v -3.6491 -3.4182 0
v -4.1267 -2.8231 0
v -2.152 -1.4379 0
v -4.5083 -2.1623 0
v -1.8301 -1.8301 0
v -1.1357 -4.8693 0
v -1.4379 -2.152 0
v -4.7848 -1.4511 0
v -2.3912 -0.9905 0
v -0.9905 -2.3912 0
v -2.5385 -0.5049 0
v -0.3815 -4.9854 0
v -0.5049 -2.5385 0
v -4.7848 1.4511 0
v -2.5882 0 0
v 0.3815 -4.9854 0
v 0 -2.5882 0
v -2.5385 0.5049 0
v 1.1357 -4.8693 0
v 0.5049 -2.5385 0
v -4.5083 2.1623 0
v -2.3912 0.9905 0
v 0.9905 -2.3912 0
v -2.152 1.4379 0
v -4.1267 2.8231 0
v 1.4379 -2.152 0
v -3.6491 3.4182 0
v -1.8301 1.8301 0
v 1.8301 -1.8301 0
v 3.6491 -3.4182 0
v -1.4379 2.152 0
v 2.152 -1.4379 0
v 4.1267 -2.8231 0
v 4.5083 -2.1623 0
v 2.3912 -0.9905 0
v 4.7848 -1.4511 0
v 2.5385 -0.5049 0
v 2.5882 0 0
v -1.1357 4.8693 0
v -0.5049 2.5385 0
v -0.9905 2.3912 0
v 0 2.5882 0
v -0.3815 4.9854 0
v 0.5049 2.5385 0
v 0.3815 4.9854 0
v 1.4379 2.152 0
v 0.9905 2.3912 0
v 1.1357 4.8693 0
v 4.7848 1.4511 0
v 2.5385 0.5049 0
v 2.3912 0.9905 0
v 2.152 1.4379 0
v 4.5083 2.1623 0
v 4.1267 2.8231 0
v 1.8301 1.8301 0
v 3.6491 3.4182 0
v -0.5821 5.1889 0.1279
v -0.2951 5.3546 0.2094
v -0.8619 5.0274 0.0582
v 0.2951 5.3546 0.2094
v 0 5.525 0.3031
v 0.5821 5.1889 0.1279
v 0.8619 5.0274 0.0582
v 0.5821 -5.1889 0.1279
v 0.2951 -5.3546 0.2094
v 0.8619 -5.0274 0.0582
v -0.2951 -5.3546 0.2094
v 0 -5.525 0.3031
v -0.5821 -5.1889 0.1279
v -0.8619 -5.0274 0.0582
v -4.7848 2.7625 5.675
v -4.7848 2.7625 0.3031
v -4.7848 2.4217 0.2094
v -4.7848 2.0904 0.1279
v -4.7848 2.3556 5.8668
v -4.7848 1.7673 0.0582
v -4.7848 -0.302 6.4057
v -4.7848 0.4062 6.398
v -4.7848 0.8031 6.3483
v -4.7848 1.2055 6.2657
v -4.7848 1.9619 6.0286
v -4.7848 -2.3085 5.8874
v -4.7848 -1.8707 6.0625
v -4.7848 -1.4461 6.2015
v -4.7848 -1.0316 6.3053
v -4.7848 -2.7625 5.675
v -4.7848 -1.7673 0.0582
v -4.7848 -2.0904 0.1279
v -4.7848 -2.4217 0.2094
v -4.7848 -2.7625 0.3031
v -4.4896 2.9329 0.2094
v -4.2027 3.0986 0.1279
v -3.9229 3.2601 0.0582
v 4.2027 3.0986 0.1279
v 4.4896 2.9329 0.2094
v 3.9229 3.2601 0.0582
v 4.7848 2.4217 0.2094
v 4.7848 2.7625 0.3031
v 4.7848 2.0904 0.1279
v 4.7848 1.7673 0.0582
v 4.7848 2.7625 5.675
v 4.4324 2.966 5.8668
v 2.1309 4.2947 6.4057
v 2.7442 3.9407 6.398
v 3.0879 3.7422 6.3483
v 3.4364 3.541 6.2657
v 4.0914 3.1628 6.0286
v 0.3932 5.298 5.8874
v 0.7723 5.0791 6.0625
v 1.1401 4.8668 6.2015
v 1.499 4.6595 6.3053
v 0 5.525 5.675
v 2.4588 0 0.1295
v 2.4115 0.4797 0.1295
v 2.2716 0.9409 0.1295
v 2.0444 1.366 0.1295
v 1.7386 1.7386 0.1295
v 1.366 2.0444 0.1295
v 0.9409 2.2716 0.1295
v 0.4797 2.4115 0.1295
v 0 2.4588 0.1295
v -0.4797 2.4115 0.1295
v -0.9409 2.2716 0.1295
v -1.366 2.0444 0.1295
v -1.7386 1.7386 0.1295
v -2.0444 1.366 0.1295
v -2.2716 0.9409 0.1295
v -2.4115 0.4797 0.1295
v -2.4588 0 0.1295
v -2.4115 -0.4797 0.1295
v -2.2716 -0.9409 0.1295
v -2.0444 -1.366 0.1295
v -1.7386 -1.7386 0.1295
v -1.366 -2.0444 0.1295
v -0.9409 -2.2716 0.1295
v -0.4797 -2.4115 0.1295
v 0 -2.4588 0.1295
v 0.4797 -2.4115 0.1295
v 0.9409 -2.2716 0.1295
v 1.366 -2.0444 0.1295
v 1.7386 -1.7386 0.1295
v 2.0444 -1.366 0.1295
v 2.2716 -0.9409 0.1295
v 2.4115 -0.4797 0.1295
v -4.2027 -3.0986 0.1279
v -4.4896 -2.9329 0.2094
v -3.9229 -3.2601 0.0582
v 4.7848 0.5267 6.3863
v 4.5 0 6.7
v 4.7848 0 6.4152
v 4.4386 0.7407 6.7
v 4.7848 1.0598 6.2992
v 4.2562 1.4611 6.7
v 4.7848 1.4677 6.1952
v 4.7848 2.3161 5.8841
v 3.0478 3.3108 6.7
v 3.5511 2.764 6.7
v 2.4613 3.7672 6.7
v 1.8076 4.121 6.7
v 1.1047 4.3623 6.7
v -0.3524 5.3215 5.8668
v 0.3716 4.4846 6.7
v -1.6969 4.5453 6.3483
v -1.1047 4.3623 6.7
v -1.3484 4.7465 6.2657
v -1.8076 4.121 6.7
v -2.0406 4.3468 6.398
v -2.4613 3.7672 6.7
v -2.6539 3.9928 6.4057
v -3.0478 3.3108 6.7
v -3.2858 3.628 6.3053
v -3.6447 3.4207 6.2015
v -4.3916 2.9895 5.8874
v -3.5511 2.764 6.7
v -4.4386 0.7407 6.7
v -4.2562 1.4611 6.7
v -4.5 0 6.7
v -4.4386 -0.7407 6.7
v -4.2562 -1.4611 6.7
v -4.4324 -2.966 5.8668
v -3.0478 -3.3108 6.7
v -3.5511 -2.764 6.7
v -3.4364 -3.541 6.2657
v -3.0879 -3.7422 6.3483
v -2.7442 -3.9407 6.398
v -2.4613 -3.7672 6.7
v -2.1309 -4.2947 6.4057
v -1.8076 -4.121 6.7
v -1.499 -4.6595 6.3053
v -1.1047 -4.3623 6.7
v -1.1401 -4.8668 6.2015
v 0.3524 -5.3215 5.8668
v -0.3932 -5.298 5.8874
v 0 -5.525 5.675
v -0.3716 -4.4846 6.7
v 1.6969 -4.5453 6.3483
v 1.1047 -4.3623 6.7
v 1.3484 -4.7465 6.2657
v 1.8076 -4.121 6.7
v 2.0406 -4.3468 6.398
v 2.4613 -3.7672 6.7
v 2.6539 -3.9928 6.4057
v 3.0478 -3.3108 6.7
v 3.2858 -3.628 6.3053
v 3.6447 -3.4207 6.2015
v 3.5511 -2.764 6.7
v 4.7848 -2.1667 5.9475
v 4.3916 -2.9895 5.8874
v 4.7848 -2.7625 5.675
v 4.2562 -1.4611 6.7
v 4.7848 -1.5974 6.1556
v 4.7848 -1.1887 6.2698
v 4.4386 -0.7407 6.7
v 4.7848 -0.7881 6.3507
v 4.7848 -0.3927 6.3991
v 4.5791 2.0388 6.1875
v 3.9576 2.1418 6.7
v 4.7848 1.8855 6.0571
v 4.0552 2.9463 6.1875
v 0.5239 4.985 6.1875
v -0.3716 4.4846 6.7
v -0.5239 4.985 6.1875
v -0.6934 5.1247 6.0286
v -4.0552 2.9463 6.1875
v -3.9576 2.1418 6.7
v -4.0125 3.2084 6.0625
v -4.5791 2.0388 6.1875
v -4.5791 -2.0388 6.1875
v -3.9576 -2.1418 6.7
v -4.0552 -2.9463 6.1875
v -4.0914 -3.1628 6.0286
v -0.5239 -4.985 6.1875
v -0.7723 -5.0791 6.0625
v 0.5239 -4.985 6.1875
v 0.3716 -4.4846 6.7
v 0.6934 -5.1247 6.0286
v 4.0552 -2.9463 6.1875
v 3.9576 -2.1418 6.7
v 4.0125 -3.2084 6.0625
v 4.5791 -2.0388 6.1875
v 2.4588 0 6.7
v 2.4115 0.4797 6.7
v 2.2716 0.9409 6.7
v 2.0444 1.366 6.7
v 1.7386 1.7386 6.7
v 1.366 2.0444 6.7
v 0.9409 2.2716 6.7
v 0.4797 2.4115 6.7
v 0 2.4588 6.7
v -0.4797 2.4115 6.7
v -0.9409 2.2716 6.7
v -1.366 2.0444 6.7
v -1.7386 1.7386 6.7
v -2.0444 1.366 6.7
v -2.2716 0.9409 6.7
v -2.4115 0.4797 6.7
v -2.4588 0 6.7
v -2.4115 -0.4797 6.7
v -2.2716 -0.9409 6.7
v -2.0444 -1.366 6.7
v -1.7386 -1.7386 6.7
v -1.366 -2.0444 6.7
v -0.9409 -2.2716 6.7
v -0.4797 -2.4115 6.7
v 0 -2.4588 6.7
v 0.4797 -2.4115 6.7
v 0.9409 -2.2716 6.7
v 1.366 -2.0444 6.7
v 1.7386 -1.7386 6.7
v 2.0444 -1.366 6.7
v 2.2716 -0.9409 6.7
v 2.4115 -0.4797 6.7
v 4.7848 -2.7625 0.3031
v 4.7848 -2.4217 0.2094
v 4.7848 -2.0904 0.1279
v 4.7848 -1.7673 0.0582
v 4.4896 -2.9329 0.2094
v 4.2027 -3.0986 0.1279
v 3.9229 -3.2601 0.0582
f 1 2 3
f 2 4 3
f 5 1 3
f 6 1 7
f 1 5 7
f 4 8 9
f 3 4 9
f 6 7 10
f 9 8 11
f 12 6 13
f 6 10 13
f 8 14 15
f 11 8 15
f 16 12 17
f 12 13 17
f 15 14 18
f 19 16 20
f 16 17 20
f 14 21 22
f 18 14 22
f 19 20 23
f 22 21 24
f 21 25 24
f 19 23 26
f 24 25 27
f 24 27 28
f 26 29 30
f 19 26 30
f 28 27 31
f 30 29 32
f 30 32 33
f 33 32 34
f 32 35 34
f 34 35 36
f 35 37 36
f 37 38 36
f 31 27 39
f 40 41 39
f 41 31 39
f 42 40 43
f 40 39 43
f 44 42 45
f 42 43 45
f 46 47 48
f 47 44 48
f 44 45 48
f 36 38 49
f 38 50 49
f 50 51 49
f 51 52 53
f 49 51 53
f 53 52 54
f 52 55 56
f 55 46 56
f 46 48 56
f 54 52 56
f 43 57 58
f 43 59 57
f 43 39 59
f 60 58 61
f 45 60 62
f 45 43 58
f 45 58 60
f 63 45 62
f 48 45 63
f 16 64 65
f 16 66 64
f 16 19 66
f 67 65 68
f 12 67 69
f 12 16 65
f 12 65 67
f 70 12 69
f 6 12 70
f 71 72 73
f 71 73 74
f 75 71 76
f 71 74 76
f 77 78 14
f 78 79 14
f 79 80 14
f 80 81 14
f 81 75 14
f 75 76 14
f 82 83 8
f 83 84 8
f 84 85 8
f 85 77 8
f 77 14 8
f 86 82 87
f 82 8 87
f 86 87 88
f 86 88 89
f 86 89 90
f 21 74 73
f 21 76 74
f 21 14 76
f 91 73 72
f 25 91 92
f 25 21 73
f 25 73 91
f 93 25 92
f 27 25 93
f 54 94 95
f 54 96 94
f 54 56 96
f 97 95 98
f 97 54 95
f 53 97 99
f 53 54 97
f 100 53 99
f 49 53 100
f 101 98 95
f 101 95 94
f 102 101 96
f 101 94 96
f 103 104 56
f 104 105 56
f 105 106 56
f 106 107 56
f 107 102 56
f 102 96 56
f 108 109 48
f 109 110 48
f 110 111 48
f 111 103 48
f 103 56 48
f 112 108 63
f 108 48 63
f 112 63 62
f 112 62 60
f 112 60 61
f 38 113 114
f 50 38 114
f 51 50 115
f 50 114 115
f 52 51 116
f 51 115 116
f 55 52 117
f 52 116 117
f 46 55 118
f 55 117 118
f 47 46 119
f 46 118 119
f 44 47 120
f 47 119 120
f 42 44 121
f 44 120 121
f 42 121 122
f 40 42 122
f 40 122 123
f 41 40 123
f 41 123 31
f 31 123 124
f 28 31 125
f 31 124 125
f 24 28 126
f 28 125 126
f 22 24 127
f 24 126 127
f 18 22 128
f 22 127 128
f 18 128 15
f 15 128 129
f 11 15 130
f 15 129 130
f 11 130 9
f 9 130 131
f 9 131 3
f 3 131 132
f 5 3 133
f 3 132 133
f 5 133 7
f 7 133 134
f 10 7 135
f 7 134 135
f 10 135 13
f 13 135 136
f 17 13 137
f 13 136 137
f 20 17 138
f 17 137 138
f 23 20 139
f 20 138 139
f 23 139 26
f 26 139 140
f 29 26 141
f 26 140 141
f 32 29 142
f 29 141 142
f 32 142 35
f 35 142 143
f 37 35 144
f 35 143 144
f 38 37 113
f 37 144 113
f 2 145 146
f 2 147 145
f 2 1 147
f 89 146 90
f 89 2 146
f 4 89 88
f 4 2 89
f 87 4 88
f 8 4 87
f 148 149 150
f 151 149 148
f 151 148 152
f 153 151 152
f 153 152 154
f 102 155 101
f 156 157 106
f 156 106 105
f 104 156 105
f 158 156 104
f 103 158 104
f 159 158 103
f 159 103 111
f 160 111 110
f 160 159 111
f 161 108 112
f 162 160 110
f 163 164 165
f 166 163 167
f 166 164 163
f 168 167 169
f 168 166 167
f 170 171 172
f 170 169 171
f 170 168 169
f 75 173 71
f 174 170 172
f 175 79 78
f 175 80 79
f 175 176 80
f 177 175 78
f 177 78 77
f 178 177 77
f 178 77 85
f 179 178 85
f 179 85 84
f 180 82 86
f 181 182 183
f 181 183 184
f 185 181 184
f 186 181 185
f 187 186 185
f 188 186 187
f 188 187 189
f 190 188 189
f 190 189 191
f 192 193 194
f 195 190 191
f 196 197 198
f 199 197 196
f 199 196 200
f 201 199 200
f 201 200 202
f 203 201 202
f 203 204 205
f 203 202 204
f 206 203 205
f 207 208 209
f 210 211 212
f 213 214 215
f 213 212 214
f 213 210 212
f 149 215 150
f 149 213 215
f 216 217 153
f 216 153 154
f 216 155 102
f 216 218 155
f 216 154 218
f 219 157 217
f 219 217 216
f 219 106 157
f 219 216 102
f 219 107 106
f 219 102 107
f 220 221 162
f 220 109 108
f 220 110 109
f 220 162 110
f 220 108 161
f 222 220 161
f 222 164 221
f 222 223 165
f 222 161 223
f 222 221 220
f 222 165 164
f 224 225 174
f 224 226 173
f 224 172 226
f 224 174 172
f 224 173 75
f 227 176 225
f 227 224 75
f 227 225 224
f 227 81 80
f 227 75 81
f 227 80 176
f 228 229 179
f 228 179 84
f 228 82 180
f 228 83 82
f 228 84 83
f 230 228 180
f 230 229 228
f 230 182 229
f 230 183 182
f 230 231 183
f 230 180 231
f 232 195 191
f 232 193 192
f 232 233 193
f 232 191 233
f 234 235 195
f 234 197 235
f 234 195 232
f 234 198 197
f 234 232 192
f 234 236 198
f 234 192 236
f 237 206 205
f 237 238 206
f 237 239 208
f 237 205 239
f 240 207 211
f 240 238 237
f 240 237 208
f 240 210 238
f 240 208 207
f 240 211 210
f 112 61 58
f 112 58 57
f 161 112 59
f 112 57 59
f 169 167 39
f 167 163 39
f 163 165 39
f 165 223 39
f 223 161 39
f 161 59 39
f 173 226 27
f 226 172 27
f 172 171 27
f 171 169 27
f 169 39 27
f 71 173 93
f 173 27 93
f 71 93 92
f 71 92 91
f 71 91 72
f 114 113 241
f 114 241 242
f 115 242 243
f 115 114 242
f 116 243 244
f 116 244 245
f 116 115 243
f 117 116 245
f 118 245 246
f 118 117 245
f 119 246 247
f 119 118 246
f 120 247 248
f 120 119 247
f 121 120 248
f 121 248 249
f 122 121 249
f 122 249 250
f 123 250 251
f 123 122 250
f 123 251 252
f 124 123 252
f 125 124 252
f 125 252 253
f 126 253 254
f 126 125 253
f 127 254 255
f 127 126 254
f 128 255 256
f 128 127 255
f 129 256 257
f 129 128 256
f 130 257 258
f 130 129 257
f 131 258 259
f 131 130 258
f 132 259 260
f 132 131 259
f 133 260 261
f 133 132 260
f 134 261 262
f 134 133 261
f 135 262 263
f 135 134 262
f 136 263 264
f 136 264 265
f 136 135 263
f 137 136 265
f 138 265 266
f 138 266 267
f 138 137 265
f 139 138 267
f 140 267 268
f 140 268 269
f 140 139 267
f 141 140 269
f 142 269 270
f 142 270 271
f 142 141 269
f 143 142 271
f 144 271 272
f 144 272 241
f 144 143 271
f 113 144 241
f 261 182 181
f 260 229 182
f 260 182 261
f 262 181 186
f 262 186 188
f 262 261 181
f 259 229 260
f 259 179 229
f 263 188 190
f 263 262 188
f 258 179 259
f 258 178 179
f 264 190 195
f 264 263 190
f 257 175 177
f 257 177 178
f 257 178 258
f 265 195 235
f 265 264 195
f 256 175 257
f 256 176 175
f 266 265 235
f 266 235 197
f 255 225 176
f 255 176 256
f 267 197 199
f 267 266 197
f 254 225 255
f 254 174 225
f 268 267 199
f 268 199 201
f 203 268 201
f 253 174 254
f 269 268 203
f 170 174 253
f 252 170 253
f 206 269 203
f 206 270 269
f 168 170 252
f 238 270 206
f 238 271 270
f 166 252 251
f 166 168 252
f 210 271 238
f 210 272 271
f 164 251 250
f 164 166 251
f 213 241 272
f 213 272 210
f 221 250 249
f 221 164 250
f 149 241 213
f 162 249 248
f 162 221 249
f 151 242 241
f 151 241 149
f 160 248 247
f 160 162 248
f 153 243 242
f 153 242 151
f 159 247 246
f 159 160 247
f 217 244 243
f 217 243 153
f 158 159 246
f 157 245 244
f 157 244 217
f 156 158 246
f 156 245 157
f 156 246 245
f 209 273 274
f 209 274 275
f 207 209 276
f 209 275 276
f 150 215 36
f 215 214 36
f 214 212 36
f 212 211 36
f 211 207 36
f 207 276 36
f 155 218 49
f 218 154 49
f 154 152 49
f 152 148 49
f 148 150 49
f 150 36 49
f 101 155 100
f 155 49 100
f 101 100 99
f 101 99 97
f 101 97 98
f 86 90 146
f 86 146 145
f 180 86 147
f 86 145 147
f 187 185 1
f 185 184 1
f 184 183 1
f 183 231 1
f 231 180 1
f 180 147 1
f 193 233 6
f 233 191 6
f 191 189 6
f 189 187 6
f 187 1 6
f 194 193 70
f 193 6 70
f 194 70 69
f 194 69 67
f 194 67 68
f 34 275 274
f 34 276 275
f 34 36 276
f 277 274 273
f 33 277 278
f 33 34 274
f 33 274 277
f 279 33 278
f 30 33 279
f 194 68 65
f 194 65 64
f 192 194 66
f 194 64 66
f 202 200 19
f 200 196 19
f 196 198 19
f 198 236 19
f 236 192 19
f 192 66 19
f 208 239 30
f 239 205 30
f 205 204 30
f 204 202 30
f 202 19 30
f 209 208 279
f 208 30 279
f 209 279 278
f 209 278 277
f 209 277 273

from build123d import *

# Parameters (mm, degrees)
SKETCH_1_R          = 2.45875
EXTRUDE_555_DEPTH   = 6.7
SKETCH_2_OUTSIDE_W  = 52.598
SKETCH_2_OUTSIDE_H  = 54.078
SKETCH_2_OUTSIDE_R  = 5
CUT_EXTRUDE_1_DEPTH = 10.915132059
CUT_EXTRUDE_1_DRAFT = -60
CHAMFER_1_SIZE      = 0.129464286
SKETCH_9_OUTSIDE_W  = 36.616
SKETCH_9_OUTSIDE_H  = 38.096
SKETCH_9_OUTSIDE_R  = 4.5
CUT_EXTRUDE_7_DEPTH = 10.915132059
CUT_EXTRUDE_7_DRAFT = -45


with BuildPart() as part:
    # 草图1 → Extrude 555 (new body)
    with BuildSketch(Plane.XY):
        Polygon((0, 5.525), (-4.784790356, 2.7625), (-4.784790356, -2.7625), (0, -5.525), (4.784790356, -2.7625), (4.784790356, 2.7625), align=None)
        Circle(SKETCH_1_R, mode=Mode.SUBTRACT)
    extrude(amount=EXTRUDE_555_DEPTH)


with BuildPart() as cut_extrude_1_tool:
    # 草图2 outside → 切除-拉伸1 (with draft: the straight prism first)
    with BuildSketch(Plane(origin=(0, 0, 0), x_dir=(-1, 0, 0), z_dir=(0, 0, -1))):
        Rectangle(SKETCH_2_OUTSIDE_W, SKETCH_2_OUTSIDE_H)
        Circle(SKETCH_2_OUTSIDE_R, mode=Mode.SUBTRACT)
    extrude(amount=-CUT_EXTRUDE_1_DEPTH)
    # 切除-拉伸1: the draft: its side faces are tilted about the plane it starts from
    cut_extrude_1_sides = [cut_extrude_1_tool.faces().sort_by_distance(p)[0] for p in [
        (0, -27.039, 5.45756603),
        (-26.299, 0, 5.45756603),
        (0, 27.039, 5.45756603),
        (26.299, 0, 5.45756603),
        (5, 0, 5.45756603),
    ]]
    draft(cut_extrude_1_sides, Plane(origin=(0, 0, 0), x_dir=(-1, 0, 0), z_dir=(0, 0, -1)), CUT_EXTRUDE_1_DRAFT)


with BuildPart() as part_1:
    add(part.part)

    # 切除-拉伸1: cut by cut_extrude_1_tool
    add(cut_extrude_1_tool.part, mode=Mode.SUBTRACT)

    # 倒角1
    chamfer_1_edges = [part_1.edges().sort_by_distance(p)[0] for p in [
        (-2.45875, 0, 0),
    ]]
    chamfer(chamfer_1_edges, length=CHAMFER_1_SIZE)


with BuildPart() as cut_extrude_7_tool:
    # 草图9 outside → 切除-拉伸7 (with draft: the straight prism first)
    with BuildSketch(Plane.XY.offset(6.7)):
        Rectangle(SKETCH_9_OUTSIDE_W, SKETCH_9_OUTSIDE_H)
        Circle(SKETCH_9_OUTSIDE_R, mode=Mode.SUBTRACT)
    extrude(amount=-CUT_EXTRUDE_7_DEPTH)
    # 切除-拉伸7: the draft: its side faces are tilted about the plane it starts from
    cut_extrude_7_sides = [cut_extrude_7_tool.faces().sort_by_distance(p)[0] for p in [
        (0, -19.048, 1.24243397),
        (18.308, 0, 1.24243397),
        (0, 19.048, 1.24243397),
        (-18.308, 0, 1.24243397),
        (-4.5, 0, 1.24243397),
    ]]
    draft(cut_extrude_7_sides, Plane.XY.offset(6.7), CUT_EXTRUDE_7_DRAFT)


with BuildPart() as part_2:
    add(part_1.part)

    # 切除-拉伸7: cut by cut_extrude_7_tool
    add(cut_extrude_7_tool.part, mode=Mode.SUBTRACT)


solid = part_2.part
